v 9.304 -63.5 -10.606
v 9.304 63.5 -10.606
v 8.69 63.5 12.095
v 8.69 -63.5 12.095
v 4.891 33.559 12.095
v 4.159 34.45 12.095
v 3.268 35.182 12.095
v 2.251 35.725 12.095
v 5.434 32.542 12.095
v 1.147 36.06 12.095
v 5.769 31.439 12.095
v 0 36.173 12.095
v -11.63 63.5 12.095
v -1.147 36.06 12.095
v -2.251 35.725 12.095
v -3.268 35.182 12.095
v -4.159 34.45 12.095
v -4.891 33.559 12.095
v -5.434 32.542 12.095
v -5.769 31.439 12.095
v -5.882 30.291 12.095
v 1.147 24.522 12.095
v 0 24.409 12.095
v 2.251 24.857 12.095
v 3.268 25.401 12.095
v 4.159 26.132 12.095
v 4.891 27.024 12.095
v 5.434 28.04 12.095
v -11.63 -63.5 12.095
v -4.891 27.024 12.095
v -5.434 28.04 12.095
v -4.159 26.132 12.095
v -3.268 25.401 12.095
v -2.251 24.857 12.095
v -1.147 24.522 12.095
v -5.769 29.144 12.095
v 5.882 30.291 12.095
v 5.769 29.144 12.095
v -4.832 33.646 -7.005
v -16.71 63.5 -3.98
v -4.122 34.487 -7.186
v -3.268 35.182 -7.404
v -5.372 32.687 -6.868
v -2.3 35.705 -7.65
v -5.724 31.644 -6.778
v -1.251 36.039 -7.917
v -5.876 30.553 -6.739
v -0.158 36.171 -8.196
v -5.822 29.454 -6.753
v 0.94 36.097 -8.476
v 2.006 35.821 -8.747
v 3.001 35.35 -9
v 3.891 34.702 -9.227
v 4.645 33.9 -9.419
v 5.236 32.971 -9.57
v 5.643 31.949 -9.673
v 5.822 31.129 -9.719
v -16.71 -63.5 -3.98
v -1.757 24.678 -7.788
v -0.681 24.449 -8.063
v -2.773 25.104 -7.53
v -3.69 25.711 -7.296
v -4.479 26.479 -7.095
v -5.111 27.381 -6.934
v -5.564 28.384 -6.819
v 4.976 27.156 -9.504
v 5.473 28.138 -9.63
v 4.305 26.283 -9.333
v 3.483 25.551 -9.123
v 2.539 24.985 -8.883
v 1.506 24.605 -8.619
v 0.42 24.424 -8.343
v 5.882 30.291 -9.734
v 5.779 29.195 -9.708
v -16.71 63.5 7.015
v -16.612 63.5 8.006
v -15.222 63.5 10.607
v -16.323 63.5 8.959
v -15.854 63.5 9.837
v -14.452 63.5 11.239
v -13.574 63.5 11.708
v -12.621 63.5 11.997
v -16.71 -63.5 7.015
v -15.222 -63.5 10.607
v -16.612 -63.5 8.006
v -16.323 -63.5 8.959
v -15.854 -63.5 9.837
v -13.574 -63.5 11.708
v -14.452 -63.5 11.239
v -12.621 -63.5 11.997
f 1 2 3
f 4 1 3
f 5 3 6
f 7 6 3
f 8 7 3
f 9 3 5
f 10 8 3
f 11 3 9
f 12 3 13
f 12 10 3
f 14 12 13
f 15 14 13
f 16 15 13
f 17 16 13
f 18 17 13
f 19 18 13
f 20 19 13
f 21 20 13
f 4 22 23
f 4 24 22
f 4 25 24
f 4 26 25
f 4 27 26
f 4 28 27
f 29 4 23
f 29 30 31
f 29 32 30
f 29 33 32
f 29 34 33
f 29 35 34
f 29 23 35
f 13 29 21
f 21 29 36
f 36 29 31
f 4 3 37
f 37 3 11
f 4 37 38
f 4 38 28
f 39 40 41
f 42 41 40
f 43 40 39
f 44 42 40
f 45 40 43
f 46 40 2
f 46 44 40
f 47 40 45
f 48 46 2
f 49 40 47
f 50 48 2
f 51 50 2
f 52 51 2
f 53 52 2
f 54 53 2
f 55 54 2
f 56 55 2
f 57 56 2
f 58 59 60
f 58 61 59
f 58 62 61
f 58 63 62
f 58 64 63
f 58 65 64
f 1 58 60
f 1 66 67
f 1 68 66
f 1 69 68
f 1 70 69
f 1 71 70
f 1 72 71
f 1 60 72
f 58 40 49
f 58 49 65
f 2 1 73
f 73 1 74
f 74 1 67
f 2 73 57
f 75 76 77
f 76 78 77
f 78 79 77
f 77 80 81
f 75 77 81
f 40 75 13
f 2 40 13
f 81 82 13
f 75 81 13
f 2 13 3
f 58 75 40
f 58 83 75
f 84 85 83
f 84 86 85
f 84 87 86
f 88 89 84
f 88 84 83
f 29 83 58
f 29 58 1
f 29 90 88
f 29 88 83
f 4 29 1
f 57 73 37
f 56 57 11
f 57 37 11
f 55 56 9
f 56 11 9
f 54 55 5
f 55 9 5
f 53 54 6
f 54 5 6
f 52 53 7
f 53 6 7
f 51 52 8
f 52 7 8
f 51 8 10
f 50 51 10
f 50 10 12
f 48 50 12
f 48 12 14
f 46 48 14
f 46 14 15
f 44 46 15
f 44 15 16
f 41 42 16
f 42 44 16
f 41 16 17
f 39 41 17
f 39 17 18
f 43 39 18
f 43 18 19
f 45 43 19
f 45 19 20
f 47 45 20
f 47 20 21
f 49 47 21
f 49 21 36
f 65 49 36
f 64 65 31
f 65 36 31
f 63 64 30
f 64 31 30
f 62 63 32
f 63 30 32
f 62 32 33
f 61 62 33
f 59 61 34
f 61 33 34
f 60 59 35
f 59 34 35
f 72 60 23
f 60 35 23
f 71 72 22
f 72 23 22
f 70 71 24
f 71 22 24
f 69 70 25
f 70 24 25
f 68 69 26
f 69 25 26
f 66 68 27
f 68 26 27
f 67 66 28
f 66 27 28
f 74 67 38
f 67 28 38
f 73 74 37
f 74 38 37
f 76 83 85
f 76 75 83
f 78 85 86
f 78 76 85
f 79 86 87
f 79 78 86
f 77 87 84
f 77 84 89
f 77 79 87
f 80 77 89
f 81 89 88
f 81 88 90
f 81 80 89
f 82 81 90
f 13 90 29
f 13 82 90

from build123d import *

# Parameters (mm, degrees)
F1_DEPTH = 63.5
F2_R     = 5.08
F3_R     = 5.881823
F4_DEPTH = 25.4


with BuildPart() as f1:
    # F0 (on Front) → F1 (new body, symmetric)
    with BuildSketch(Plane.XZ):
        Polygon((-16.709963, 12.094708), (-16.709963, -3.979688), (9.303563, -10.605776), (8.690037, 12.094708), align=None)
    extrude(amount=F1_DEPTH, both=True)

    # F2
    f2_edges = [f1.edges().sort_by_distance(p)[0] for p in [
        (-16.709963, 0, 12.094708),
    ]]
    fillet(f2_edges, radius=F2_R)

    # F3 (on face) → F4 (cut)
    with BuildSketch(Plane.XY.offset(12.094708)):
        with Locations((0, 30.291276)):
            Circle(F3_R)
    extrude(amount=-F4_DEPTH, mode=Mode.SUBTRACT)


solid = f1.part
